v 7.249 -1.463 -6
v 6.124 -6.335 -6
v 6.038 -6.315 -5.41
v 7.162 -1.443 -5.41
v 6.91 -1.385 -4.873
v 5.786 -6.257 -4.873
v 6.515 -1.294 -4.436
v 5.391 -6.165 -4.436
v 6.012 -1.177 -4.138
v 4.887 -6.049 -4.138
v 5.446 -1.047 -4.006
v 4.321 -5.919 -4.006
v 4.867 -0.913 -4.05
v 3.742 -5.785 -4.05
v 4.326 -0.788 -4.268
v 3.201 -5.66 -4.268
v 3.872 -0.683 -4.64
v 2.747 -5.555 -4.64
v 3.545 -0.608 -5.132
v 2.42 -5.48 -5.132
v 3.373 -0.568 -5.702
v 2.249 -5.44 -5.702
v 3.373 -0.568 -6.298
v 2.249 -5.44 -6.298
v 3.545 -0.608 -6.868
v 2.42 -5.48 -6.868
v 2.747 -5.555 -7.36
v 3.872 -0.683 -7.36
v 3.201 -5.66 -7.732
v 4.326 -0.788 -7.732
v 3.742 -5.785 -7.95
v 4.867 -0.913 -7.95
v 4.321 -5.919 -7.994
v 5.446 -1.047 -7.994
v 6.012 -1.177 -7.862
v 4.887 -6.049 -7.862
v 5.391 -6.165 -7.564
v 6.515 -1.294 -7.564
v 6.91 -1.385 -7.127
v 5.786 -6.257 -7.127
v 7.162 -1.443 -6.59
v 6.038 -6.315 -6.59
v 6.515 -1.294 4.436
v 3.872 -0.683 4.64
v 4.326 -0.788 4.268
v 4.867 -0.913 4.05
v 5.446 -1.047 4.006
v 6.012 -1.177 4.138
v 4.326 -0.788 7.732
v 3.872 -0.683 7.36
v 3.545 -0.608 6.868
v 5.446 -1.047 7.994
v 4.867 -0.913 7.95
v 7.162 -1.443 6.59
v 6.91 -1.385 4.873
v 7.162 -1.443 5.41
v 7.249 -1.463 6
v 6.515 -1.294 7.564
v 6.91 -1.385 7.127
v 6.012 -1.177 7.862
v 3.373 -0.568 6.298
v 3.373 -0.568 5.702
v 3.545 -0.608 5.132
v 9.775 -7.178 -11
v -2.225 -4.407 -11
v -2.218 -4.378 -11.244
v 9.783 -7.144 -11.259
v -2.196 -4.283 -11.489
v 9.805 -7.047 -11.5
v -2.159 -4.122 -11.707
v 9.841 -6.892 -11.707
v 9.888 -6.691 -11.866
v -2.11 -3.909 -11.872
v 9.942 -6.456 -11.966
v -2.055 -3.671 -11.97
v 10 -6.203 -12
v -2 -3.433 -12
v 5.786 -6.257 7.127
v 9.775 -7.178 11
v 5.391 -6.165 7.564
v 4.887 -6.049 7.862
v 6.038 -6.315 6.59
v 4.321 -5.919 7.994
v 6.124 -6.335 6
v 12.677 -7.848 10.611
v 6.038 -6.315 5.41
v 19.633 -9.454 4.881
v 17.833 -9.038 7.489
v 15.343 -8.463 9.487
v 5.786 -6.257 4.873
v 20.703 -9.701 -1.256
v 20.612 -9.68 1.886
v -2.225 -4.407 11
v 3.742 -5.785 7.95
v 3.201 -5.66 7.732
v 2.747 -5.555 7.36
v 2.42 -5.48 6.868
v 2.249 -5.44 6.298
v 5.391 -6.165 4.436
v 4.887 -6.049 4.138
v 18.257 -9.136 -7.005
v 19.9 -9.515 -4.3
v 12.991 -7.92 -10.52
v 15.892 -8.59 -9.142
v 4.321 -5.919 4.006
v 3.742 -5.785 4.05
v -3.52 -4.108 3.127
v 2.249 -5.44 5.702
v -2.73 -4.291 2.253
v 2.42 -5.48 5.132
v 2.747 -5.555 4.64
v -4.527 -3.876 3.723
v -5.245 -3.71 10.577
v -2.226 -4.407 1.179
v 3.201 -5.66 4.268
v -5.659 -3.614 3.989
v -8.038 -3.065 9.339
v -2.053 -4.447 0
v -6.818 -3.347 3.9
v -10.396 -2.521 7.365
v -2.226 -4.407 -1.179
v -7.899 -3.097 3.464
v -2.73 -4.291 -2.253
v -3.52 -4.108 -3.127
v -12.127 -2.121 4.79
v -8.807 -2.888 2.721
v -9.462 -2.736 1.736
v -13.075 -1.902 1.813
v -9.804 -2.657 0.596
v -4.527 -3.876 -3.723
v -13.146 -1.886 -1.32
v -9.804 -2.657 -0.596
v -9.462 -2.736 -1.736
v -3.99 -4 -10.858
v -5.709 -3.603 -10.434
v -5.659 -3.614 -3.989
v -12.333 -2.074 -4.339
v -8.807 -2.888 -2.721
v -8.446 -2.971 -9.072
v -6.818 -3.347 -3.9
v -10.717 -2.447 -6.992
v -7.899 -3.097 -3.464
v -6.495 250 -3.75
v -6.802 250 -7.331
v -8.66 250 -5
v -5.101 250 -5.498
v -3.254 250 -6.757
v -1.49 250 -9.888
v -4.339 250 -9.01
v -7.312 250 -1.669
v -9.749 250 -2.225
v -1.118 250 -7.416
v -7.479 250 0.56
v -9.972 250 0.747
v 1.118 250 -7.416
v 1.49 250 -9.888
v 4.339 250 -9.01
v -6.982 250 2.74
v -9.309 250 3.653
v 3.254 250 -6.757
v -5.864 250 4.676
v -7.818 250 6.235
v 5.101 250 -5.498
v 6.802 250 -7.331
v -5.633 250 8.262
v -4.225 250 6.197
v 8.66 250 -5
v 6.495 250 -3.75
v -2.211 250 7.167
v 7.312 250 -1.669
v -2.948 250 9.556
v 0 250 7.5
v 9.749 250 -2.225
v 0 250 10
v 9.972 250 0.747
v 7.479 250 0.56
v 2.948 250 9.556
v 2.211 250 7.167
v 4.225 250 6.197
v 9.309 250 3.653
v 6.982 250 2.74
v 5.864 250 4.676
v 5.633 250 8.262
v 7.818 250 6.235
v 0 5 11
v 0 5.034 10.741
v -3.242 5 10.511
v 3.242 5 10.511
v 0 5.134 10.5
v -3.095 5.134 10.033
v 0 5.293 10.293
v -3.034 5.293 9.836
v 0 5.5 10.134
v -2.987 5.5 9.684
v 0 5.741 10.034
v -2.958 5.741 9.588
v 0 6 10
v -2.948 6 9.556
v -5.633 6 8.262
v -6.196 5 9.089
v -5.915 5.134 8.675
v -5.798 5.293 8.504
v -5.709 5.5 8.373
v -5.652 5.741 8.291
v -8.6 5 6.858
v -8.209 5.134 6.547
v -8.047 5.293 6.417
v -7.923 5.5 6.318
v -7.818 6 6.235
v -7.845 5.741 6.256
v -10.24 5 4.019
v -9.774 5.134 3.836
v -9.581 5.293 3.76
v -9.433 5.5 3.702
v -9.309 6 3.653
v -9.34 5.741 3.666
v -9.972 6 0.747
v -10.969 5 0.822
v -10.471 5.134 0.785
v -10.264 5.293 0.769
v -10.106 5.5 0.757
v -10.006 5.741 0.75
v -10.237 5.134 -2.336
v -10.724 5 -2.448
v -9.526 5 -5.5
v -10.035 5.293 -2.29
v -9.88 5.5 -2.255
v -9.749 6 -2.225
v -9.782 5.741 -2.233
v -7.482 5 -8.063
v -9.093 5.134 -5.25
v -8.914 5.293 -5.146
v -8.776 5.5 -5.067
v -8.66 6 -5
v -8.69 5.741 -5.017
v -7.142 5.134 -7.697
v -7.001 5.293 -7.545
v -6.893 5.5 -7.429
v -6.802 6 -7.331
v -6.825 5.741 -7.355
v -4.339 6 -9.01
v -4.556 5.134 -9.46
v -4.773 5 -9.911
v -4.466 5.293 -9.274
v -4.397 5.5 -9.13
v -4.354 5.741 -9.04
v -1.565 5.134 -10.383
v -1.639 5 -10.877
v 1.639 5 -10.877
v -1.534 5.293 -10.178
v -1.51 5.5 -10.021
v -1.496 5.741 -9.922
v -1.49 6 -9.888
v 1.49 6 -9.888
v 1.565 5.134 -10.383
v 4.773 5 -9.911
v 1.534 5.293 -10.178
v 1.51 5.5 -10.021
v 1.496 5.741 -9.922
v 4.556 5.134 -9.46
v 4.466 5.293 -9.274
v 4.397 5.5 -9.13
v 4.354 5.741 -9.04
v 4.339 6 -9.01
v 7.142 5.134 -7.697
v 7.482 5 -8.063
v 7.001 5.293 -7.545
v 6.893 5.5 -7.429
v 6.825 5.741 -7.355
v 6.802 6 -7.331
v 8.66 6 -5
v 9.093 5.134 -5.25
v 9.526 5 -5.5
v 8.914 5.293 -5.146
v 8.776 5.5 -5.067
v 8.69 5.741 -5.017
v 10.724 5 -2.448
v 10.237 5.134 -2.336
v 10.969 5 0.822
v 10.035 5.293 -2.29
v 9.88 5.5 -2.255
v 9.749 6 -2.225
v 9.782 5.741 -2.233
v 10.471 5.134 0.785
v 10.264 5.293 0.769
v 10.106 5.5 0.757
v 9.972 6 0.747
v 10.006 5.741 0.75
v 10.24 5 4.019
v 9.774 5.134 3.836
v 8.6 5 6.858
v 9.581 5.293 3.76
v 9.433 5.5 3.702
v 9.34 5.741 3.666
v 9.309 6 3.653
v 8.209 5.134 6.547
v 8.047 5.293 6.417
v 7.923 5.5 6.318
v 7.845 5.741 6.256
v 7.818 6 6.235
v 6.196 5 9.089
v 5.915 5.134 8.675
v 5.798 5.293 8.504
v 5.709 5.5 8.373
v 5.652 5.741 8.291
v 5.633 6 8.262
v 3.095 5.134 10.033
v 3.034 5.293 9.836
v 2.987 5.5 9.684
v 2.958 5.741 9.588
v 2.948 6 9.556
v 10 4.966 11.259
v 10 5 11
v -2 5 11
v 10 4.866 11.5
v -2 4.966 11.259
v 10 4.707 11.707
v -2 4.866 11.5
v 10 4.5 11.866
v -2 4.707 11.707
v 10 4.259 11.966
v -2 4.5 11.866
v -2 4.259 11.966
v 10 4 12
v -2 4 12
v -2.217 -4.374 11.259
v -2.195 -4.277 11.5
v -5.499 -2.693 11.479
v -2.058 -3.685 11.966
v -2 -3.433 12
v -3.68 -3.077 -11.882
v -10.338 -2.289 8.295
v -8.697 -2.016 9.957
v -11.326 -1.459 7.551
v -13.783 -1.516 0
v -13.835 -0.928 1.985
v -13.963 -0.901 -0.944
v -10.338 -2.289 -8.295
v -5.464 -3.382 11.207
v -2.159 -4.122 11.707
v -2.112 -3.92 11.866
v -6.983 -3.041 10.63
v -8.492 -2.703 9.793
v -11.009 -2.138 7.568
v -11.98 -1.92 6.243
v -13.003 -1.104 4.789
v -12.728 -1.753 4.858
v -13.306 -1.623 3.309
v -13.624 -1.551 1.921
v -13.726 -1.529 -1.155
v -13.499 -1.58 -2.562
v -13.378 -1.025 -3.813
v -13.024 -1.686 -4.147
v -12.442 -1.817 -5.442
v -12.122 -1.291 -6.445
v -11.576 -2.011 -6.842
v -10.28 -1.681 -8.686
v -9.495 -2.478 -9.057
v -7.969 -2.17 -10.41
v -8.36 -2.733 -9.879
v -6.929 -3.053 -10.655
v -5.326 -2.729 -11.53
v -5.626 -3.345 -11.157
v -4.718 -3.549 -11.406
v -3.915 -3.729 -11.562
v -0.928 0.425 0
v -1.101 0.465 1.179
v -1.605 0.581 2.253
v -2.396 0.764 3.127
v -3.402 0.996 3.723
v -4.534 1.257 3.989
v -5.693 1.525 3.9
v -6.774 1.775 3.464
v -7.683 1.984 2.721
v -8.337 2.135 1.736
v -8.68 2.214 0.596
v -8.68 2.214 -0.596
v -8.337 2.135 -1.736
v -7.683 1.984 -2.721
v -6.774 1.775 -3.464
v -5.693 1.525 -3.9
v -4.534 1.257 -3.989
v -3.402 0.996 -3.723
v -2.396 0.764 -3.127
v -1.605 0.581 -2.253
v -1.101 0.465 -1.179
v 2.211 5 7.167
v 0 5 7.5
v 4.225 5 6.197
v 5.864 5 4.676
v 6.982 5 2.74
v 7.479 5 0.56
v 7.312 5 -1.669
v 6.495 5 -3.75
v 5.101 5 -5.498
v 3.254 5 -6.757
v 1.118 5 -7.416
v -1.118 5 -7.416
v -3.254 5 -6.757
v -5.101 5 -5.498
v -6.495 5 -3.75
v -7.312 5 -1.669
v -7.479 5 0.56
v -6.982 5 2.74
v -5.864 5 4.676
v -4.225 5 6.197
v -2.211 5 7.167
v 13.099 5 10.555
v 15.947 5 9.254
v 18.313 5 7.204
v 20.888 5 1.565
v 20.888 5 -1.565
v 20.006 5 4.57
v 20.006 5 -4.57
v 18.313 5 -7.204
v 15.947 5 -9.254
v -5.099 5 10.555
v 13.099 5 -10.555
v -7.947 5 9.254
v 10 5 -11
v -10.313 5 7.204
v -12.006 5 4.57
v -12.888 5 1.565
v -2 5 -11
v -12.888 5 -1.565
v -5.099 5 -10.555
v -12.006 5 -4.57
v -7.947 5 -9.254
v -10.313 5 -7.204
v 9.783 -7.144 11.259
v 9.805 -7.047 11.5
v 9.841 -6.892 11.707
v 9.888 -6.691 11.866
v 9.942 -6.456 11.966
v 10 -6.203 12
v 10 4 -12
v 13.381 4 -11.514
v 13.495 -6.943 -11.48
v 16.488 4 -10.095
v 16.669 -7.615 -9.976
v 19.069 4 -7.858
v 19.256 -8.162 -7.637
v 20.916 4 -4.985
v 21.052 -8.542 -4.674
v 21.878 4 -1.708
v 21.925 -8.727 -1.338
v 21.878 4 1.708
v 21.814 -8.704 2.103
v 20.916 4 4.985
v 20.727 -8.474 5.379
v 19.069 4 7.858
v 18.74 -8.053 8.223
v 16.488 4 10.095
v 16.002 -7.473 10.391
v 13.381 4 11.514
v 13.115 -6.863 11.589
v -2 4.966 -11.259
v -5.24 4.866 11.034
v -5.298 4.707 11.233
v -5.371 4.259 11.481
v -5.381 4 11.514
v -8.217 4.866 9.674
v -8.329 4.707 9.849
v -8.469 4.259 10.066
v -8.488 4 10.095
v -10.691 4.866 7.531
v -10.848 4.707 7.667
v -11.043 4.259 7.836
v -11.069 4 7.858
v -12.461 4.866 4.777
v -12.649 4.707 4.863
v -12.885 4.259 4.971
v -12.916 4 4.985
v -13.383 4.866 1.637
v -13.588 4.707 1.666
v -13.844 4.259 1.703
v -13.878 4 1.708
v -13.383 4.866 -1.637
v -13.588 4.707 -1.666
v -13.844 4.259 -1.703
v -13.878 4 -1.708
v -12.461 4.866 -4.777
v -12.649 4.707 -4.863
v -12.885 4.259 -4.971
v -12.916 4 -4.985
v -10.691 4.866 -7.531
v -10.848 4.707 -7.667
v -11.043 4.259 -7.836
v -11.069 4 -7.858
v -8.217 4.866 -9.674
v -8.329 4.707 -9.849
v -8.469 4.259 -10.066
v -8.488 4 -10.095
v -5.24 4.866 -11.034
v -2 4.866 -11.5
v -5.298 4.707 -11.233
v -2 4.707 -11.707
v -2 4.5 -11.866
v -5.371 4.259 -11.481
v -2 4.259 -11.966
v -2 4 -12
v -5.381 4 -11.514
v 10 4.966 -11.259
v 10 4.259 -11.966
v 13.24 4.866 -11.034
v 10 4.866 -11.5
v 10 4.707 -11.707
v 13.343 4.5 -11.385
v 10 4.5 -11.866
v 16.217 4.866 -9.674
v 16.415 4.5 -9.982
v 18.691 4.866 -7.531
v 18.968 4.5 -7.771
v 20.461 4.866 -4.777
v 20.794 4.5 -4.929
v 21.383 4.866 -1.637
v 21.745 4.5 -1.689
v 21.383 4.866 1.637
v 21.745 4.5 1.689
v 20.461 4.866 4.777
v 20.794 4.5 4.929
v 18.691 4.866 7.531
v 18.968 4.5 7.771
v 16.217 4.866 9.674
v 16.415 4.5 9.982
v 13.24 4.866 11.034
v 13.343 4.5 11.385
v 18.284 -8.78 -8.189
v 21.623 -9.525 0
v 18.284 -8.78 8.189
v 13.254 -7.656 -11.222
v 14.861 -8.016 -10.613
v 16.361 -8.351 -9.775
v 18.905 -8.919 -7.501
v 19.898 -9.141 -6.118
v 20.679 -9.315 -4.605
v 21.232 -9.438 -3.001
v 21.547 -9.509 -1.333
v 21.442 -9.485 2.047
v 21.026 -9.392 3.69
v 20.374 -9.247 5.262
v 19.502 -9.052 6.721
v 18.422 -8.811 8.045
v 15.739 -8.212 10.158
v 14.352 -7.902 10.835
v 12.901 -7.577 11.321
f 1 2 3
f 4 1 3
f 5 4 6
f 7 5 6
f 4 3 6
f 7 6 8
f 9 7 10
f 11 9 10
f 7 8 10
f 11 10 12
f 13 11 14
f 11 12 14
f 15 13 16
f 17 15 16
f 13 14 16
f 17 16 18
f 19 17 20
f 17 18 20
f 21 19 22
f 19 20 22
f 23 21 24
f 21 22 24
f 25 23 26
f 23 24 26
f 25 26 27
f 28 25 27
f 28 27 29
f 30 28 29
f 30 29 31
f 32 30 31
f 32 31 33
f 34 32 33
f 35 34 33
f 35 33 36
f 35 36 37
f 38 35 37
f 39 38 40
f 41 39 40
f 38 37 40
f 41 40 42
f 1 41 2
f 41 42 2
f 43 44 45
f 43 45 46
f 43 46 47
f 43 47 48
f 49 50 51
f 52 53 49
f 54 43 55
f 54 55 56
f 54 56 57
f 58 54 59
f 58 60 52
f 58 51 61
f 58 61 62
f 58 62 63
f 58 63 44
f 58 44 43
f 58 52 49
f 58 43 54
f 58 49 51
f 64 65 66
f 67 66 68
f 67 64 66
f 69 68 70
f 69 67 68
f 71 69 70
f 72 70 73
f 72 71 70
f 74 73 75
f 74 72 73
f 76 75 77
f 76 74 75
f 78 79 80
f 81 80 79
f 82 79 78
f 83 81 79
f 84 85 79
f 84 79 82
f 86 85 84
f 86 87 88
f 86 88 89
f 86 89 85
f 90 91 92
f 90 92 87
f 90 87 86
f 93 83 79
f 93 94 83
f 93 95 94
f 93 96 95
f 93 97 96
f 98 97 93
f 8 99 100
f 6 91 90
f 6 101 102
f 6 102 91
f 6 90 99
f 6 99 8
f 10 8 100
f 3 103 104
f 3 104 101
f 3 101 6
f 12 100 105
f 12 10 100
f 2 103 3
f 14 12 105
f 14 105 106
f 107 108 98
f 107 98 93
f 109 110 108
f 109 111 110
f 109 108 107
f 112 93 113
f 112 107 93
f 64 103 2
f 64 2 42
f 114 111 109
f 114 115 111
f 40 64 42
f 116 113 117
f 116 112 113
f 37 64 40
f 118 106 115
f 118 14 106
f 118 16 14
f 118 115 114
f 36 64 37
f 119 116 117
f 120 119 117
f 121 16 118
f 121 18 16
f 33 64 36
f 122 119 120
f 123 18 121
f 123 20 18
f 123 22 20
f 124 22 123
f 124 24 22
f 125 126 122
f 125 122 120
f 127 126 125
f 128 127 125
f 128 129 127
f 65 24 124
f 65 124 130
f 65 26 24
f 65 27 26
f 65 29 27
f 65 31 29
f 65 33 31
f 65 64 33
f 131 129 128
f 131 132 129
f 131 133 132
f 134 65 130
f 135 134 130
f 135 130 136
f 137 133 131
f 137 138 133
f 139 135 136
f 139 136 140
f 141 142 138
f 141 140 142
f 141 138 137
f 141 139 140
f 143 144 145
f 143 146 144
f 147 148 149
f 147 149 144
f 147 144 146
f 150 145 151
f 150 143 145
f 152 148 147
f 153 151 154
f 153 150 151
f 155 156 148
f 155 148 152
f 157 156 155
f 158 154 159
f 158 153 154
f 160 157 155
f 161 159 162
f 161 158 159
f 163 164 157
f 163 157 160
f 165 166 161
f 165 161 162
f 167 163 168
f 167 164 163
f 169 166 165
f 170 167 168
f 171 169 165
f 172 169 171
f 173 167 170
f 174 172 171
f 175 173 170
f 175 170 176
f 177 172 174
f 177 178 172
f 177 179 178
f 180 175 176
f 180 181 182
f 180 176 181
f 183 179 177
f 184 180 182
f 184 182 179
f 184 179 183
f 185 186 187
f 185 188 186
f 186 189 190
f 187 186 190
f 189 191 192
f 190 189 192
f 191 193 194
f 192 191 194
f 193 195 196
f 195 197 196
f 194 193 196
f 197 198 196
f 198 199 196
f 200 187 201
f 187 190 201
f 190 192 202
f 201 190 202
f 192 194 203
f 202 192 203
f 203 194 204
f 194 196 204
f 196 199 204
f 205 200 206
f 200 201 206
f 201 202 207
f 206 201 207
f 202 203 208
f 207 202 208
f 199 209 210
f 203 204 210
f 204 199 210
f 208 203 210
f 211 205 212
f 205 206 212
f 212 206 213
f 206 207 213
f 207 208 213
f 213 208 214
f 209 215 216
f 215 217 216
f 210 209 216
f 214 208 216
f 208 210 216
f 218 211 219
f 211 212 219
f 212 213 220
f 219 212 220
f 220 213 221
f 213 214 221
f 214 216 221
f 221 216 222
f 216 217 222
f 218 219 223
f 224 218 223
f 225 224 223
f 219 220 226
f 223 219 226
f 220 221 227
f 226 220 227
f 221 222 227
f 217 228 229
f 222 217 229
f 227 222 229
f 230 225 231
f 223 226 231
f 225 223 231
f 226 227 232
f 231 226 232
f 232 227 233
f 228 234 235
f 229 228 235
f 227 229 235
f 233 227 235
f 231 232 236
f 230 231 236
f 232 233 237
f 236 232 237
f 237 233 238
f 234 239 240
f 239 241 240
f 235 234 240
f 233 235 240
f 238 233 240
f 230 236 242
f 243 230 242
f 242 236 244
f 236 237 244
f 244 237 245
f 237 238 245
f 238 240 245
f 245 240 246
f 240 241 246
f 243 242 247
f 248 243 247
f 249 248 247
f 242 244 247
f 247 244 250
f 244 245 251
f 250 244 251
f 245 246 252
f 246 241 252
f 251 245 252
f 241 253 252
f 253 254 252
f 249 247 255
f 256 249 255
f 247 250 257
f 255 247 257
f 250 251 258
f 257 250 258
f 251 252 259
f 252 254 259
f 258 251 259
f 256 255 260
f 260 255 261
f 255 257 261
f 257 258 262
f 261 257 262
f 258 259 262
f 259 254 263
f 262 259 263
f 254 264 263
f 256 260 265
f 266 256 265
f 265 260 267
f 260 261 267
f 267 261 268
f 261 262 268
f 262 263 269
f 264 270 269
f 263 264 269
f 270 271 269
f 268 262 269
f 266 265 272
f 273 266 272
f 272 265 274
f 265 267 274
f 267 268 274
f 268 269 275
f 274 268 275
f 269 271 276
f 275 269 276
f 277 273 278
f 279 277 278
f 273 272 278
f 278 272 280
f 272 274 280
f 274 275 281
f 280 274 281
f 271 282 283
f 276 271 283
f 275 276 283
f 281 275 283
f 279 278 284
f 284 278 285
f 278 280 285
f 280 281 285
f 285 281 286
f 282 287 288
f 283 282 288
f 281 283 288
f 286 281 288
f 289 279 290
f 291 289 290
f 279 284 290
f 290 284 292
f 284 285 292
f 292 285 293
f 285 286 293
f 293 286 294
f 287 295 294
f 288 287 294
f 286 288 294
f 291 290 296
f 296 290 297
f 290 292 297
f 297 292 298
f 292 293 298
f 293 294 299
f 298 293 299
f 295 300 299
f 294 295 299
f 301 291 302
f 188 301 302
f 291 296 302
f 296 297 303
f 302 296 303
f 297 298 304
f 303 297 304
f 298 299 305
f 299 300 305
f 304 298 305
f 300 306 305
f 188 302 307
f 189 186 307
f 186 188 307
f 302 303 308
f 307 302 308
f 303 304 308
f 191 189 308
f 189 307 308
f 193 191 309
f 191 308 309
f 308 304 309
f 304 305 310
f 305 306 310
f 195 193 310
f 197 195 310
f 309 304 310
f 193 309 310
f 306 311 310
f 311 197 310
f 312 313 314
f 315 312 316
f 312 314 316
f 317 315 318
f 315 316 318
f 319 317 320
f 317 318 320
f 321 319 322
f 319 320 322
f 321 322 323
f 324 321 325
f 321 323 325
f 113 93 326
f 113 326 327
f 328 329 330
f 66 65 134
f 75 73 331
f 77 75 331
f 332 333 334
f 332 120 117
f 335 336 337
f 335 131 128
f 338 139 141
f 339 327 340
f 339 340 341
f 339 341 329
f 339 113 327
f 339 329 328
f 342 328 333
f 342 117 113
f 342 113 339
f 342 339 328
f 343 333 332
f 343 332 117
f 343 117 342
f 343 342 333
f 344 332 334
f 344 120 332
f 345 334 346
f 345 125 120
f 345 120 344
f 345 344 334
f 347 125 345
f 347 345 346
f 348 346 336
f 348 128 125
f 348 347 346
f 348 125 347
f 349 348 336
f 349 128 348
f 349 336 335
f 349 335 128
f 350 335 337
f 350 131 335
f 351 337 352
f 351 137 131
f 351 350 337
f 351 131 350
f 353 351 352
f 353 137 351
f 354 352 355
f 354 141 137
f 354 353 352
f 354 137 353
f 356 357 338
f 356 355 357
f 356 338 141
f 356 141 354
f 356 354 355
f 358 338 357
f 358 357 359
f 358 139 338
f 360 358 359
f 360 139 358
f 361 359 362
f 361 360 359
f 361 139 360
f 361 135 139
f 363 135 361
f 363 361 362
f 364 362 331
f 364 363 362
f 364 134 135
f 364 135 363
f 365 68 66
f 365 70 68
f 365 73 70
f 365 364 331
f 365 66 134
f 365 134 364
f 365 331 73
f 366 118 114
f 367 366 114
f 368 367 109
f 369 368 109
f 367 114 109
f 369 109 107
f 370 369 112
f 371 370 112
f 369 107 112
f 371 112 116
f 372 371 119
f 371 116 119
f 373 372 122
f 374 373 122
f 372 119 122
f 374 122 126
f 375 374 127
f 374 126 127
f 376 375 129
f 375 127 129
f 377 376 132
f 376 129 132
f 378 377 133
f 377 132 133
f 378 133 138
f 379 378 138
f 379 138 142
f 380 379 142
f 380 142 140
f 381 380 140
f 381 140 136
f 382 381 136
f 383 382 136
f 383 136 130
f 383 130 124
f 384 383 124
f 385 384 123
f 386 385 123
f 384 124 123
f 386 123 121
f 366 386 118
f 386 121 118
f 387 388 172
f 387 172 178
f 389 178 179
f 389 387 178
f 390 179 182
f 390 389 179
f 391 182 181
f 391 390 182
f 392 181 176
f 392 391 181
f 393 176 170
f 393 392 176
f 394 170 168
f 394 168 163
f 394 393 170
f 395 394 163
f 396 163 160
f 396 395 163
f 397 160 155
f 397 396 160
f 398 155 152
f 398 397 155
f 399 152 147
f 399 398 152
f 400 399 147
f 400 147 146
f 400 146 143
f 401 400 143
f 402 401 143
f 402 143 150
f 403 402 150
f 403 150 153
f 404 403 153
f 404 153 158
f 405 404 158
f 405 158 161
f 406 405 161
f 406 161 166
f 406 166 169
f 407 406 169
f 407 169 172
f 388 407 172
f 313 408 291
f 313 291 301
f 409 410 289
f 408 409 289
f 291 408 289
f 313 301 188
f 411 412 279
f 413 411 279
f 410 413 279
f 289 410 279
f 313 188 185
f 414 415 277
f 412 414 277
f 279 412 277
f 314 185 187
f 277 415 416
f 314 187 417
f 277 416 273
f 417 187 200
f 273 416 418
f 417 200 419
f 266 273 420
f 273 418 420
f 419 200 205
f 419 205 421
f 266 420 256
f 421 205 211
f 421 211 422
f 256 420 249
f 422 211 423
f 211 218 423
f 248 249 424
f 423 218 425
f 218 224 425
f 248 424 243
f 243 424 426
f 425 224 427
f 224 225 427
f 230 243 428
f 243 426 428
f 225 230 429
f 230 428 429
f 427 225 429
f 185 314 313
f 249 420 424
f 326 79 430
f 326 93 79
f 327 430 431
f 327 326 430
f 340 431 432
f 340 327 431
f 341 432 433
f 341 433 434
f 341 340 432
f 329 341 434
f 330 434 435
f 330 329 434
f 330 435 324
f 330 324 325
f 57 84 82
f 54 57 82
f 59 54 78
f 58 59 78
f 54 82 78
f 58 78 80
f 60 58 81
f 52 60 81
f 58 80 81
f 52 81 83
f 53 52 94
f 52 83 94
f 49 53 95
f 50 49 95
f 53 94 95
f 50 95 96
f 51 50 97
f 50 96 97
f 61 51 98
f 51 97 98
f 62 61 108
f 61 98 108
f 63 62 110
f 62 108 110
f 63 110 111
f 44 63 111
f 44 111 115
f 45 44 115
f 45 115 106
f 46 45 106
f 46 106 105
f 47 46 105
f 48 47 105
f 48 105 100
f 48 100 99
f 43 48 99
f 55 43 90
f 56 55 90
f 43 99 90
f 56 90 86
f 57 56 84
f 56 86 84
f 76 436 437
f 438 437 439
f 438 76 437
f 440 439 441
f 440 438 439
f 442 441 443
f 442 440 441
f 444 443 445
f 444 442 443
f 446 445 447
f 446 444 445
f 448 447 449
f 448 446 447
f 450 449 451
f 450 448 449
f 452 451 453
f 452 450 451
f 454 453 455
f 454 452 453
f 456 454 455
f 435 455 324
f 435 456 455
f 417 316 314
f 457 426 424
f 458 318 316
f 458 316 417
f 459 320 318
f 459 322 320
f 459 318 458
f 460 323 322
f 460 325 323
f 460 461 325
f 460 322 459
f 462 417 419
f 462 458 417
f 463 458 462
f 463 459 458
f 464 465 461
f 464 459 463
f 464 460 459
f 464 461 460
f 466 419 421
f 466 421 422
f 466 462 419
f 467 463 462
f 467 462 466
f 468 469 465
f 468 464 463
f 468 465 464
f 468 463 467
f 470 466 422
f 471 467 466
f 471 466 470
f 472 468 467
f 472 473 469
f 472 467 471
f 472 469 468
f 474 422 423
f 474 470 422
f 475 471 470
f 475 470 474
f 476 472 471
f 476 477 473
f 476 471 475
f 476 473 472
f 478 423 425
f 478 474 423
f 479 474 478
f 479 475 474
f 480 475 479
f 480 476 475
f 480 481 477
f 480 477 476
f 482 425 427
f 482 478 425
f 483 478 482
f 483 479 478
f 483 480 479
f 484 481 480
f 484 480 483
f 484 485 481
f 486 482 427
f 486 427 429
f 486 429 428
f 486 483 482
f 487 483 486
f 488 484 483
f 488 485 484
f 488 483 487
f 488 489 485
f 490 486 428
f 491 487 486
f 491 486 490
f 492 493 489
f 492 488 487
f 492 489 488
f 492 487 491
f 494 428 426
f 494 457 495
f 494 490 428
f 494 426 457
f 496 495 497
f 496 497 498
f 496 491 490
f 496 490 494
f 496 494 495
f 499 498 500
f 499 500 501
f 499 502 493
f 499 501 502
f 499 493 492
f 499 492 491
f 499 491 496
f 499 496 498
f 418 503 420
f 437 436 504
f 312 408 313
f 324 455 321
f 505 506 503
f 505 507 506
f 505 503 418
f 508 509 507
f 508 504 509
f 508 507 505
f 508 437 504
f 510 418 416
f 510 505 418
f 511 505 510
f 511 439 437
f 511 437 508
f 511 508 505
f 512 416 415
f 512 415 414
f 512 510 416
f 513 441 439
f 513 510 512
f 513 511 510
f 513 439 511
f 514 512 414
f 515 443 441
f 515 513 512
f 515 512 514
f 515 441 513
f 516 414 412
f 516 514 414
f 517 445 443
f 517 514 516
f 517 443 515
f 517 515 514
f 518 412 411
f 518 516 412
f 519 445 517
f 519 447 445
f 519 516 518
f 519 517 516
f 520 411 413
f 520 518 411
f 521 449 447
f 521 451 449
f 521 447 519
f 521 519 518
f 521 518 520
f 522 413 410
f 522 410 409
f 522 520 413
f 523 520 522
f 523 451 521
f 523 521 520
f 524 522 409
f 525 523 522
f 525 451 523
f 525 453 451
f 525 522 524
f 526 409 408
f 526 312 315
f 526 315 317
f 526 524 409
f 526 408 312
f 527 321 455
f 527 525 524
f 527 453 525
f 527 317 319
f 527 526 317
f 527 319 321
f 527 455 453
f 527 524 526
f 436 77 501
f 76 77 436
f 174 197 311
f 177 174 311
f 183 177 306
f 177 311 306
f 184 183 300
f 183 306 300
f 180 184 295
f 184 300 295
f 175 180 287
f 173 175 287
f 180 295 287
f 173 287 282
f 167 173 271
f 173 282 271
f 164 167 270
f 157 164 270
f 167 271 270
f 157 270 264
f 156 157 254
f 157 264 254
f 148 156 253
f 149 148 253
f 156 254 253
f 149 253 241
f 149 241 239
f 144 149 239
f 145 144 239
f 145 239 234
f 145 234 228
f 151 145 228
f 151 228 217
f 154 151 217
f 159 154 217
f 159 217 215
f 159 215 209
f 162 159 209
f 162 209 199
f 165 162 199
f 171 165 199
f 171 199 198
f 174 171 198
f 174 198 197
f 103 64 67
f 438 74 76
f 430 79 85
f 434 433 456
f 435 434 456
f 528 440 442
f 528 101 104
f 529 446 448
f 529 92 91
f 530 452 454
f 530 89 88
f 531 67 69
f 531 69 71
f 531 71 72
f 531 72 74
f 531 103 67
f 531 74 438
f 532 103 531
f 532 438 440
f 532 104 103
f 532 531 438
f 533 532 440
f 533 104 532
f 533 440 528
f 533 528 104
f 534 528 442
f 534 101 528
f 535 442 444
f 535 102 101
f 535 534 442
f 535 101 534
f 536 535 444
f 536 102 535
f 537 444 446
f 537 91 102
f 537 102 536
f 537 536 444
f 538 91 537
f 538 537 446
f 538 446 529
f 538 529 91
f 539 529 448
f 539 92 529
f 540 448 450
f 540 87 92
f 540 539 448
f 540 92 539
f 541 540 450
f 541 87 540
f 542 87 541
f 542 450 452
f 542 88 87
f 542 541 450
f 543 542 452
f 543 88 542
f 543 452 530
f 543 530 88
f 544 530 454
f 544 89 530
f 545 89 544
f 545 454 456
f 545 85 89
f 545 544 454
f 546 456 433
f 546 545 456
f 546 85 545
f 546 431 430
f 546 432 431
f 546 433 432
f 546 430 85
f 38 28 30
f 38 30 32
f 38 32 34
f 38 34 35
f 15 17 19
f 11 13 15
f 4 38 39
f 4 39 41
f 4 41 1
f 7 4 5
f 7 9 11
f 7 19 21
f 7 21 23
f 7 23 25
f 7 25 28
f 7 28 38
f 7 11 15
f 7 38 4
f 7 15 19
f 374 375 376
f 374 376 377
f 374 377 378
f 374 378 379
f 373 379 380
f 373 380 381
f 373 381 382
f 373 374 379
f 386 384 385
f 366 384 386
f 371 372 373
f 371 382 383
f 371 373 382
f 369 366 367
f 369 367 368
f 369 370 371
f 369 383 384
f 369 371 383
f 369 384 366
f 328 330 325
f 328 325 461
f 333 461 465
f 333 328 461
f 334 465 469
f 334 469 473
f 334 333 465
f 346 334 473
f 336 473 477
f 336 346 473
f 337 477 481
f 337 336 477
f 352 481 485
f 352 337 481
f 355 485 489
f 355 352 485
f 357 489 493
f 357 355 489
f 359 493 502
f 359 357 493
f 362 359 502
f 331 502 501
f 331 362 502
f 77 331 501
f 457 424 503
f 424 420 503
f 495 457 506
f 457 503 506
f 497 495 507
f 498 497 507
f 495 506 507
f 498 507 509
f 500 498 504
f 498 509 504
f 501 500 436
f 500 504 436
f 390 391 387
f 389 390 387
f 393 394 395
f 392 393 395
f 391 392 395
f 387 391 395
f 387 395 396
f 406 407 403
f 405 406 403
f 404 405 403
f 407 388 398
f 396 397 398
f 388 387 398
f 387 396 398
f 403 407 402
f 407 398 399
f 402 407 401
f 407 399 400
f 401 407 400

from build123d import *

# Parameters (mm, degrees)
SKETCH_1_R               = 10
SKETCH_1_R_2             = 7.5
EXTRUDE_1_DEPTH          = 250
EXTRUDE_2_DEPTH          = 5
EXTRUDE_2_DEPTH_BACK     = 10
CUT_EXTRUDE_1_DEPTH      = 252.25286068
CUT_EXTRUDE_1_DEPTH_BACK = 252.25286068
FILLET_1_R               = 1
SKETCH_5_R               = 4
SKETCH_5_R_2             = 2
CUT_EXTRUDE_2_DEPTH      = 5


with BuildPart() as part:
    # 草图1 → 凸台-拉伸1 (new body)
    with BuildSketch(Plane(origin=(0, 0, 0), x_dir=(1, 0, 0), z_dir=(0, 1, 0))):
        with Locations(Location((0, 0, 0), (0, 0, 270))):
            Circle(SKETCH_1_R)
        with Locations(Location((0, 0, 0), (0, 0, 270))):
            Circle(SKETCH_1_R_2, mode=Mode.SUBTRACT)
    extrude(amount=EXTRUDE_1_DEPTH)

    # 草图2 → 凸台-拉伸2 (add, two sides: drawn at the far end of the back side and taken through both)
    with BuildSketch(Plane(origin=(0, 0, 0), x_dir=(1, 0, 0), z_dir=(0, 1, 0)).offset(-EXTRUDE_2_DEPTH_BACK)):
        with BuildLine():
            Line((10, -12), (-2, -12))
            ThreePointArc((-2, -12), (-14, 0), (-2, 12))
            Line((-2, 12), (10, 12))
            ThreePointArc((10, 12), (22, 0), (10, -12))
        make_face()
    extrude(amount=EXTRUDE_2_DEPTH + EXTRUDE_2_DEPTH_BACK)

    # 草图4 → 切除-拉伸1 (cut, two sides: drawn at the far end of the back side and taken through both)
    with BuildSketch(Plane.XY.offset(-CUT_EXTRUDE_1_DEPTH_BACK)):
        Polygon((-14, -1.688745119), (-14, -10), (22, -10), align=None)
    extrude(amount=CUT_EXTRUDE_1_DEPTH + CUT_EXTRUDE_1_DEPTH_BACK, mode=Mode.SUBTRACT)

    # 圆角1
    fillet_1_edges = [part.edges().sort_by_distance(p)[0] for p in [
        (0, 5, -10),
        (22, 5, 0),
        (4, 5, -12),
        (-14, 5, 0),
        (4, 5, 12),
        (18.485281374, -9.188563269, -8.485281374),
        (-10.485281374, -2.500181851, 8.485281374),
        (4, -5.84437256, 12),
        (4, -5.84437256, -12),
    ]]
    fillet(fillet_1_edges, radius=FILLET_1_R - 0.0001)  # a hair under: the kernel refuses the full size

    # 草图5 → 切除-拉伸2 (cut)
    with BuildSketch(Plane(origin=(-1.078590243, -4.671887617, 0), x_dir=(0.9743700647852368, -0.22495105434385856, 0), z_dir=(-0.22495105434385856, -0.9743700647852368, 0))):
        with Locations((-5, 0)):
            Circle(SKETCH_5_R)
        with Locations((5.392304845, 6)):
            Circle(SKETCH_5_R_2)
        with Locations((5.392304845, -6)):
            Circle(SKETCH_5_R_2)
    extrude(amount=-CUT_EXTRUDE_2_DEPTH, mode=Mode.SUBTRACT)


solid = part.part
